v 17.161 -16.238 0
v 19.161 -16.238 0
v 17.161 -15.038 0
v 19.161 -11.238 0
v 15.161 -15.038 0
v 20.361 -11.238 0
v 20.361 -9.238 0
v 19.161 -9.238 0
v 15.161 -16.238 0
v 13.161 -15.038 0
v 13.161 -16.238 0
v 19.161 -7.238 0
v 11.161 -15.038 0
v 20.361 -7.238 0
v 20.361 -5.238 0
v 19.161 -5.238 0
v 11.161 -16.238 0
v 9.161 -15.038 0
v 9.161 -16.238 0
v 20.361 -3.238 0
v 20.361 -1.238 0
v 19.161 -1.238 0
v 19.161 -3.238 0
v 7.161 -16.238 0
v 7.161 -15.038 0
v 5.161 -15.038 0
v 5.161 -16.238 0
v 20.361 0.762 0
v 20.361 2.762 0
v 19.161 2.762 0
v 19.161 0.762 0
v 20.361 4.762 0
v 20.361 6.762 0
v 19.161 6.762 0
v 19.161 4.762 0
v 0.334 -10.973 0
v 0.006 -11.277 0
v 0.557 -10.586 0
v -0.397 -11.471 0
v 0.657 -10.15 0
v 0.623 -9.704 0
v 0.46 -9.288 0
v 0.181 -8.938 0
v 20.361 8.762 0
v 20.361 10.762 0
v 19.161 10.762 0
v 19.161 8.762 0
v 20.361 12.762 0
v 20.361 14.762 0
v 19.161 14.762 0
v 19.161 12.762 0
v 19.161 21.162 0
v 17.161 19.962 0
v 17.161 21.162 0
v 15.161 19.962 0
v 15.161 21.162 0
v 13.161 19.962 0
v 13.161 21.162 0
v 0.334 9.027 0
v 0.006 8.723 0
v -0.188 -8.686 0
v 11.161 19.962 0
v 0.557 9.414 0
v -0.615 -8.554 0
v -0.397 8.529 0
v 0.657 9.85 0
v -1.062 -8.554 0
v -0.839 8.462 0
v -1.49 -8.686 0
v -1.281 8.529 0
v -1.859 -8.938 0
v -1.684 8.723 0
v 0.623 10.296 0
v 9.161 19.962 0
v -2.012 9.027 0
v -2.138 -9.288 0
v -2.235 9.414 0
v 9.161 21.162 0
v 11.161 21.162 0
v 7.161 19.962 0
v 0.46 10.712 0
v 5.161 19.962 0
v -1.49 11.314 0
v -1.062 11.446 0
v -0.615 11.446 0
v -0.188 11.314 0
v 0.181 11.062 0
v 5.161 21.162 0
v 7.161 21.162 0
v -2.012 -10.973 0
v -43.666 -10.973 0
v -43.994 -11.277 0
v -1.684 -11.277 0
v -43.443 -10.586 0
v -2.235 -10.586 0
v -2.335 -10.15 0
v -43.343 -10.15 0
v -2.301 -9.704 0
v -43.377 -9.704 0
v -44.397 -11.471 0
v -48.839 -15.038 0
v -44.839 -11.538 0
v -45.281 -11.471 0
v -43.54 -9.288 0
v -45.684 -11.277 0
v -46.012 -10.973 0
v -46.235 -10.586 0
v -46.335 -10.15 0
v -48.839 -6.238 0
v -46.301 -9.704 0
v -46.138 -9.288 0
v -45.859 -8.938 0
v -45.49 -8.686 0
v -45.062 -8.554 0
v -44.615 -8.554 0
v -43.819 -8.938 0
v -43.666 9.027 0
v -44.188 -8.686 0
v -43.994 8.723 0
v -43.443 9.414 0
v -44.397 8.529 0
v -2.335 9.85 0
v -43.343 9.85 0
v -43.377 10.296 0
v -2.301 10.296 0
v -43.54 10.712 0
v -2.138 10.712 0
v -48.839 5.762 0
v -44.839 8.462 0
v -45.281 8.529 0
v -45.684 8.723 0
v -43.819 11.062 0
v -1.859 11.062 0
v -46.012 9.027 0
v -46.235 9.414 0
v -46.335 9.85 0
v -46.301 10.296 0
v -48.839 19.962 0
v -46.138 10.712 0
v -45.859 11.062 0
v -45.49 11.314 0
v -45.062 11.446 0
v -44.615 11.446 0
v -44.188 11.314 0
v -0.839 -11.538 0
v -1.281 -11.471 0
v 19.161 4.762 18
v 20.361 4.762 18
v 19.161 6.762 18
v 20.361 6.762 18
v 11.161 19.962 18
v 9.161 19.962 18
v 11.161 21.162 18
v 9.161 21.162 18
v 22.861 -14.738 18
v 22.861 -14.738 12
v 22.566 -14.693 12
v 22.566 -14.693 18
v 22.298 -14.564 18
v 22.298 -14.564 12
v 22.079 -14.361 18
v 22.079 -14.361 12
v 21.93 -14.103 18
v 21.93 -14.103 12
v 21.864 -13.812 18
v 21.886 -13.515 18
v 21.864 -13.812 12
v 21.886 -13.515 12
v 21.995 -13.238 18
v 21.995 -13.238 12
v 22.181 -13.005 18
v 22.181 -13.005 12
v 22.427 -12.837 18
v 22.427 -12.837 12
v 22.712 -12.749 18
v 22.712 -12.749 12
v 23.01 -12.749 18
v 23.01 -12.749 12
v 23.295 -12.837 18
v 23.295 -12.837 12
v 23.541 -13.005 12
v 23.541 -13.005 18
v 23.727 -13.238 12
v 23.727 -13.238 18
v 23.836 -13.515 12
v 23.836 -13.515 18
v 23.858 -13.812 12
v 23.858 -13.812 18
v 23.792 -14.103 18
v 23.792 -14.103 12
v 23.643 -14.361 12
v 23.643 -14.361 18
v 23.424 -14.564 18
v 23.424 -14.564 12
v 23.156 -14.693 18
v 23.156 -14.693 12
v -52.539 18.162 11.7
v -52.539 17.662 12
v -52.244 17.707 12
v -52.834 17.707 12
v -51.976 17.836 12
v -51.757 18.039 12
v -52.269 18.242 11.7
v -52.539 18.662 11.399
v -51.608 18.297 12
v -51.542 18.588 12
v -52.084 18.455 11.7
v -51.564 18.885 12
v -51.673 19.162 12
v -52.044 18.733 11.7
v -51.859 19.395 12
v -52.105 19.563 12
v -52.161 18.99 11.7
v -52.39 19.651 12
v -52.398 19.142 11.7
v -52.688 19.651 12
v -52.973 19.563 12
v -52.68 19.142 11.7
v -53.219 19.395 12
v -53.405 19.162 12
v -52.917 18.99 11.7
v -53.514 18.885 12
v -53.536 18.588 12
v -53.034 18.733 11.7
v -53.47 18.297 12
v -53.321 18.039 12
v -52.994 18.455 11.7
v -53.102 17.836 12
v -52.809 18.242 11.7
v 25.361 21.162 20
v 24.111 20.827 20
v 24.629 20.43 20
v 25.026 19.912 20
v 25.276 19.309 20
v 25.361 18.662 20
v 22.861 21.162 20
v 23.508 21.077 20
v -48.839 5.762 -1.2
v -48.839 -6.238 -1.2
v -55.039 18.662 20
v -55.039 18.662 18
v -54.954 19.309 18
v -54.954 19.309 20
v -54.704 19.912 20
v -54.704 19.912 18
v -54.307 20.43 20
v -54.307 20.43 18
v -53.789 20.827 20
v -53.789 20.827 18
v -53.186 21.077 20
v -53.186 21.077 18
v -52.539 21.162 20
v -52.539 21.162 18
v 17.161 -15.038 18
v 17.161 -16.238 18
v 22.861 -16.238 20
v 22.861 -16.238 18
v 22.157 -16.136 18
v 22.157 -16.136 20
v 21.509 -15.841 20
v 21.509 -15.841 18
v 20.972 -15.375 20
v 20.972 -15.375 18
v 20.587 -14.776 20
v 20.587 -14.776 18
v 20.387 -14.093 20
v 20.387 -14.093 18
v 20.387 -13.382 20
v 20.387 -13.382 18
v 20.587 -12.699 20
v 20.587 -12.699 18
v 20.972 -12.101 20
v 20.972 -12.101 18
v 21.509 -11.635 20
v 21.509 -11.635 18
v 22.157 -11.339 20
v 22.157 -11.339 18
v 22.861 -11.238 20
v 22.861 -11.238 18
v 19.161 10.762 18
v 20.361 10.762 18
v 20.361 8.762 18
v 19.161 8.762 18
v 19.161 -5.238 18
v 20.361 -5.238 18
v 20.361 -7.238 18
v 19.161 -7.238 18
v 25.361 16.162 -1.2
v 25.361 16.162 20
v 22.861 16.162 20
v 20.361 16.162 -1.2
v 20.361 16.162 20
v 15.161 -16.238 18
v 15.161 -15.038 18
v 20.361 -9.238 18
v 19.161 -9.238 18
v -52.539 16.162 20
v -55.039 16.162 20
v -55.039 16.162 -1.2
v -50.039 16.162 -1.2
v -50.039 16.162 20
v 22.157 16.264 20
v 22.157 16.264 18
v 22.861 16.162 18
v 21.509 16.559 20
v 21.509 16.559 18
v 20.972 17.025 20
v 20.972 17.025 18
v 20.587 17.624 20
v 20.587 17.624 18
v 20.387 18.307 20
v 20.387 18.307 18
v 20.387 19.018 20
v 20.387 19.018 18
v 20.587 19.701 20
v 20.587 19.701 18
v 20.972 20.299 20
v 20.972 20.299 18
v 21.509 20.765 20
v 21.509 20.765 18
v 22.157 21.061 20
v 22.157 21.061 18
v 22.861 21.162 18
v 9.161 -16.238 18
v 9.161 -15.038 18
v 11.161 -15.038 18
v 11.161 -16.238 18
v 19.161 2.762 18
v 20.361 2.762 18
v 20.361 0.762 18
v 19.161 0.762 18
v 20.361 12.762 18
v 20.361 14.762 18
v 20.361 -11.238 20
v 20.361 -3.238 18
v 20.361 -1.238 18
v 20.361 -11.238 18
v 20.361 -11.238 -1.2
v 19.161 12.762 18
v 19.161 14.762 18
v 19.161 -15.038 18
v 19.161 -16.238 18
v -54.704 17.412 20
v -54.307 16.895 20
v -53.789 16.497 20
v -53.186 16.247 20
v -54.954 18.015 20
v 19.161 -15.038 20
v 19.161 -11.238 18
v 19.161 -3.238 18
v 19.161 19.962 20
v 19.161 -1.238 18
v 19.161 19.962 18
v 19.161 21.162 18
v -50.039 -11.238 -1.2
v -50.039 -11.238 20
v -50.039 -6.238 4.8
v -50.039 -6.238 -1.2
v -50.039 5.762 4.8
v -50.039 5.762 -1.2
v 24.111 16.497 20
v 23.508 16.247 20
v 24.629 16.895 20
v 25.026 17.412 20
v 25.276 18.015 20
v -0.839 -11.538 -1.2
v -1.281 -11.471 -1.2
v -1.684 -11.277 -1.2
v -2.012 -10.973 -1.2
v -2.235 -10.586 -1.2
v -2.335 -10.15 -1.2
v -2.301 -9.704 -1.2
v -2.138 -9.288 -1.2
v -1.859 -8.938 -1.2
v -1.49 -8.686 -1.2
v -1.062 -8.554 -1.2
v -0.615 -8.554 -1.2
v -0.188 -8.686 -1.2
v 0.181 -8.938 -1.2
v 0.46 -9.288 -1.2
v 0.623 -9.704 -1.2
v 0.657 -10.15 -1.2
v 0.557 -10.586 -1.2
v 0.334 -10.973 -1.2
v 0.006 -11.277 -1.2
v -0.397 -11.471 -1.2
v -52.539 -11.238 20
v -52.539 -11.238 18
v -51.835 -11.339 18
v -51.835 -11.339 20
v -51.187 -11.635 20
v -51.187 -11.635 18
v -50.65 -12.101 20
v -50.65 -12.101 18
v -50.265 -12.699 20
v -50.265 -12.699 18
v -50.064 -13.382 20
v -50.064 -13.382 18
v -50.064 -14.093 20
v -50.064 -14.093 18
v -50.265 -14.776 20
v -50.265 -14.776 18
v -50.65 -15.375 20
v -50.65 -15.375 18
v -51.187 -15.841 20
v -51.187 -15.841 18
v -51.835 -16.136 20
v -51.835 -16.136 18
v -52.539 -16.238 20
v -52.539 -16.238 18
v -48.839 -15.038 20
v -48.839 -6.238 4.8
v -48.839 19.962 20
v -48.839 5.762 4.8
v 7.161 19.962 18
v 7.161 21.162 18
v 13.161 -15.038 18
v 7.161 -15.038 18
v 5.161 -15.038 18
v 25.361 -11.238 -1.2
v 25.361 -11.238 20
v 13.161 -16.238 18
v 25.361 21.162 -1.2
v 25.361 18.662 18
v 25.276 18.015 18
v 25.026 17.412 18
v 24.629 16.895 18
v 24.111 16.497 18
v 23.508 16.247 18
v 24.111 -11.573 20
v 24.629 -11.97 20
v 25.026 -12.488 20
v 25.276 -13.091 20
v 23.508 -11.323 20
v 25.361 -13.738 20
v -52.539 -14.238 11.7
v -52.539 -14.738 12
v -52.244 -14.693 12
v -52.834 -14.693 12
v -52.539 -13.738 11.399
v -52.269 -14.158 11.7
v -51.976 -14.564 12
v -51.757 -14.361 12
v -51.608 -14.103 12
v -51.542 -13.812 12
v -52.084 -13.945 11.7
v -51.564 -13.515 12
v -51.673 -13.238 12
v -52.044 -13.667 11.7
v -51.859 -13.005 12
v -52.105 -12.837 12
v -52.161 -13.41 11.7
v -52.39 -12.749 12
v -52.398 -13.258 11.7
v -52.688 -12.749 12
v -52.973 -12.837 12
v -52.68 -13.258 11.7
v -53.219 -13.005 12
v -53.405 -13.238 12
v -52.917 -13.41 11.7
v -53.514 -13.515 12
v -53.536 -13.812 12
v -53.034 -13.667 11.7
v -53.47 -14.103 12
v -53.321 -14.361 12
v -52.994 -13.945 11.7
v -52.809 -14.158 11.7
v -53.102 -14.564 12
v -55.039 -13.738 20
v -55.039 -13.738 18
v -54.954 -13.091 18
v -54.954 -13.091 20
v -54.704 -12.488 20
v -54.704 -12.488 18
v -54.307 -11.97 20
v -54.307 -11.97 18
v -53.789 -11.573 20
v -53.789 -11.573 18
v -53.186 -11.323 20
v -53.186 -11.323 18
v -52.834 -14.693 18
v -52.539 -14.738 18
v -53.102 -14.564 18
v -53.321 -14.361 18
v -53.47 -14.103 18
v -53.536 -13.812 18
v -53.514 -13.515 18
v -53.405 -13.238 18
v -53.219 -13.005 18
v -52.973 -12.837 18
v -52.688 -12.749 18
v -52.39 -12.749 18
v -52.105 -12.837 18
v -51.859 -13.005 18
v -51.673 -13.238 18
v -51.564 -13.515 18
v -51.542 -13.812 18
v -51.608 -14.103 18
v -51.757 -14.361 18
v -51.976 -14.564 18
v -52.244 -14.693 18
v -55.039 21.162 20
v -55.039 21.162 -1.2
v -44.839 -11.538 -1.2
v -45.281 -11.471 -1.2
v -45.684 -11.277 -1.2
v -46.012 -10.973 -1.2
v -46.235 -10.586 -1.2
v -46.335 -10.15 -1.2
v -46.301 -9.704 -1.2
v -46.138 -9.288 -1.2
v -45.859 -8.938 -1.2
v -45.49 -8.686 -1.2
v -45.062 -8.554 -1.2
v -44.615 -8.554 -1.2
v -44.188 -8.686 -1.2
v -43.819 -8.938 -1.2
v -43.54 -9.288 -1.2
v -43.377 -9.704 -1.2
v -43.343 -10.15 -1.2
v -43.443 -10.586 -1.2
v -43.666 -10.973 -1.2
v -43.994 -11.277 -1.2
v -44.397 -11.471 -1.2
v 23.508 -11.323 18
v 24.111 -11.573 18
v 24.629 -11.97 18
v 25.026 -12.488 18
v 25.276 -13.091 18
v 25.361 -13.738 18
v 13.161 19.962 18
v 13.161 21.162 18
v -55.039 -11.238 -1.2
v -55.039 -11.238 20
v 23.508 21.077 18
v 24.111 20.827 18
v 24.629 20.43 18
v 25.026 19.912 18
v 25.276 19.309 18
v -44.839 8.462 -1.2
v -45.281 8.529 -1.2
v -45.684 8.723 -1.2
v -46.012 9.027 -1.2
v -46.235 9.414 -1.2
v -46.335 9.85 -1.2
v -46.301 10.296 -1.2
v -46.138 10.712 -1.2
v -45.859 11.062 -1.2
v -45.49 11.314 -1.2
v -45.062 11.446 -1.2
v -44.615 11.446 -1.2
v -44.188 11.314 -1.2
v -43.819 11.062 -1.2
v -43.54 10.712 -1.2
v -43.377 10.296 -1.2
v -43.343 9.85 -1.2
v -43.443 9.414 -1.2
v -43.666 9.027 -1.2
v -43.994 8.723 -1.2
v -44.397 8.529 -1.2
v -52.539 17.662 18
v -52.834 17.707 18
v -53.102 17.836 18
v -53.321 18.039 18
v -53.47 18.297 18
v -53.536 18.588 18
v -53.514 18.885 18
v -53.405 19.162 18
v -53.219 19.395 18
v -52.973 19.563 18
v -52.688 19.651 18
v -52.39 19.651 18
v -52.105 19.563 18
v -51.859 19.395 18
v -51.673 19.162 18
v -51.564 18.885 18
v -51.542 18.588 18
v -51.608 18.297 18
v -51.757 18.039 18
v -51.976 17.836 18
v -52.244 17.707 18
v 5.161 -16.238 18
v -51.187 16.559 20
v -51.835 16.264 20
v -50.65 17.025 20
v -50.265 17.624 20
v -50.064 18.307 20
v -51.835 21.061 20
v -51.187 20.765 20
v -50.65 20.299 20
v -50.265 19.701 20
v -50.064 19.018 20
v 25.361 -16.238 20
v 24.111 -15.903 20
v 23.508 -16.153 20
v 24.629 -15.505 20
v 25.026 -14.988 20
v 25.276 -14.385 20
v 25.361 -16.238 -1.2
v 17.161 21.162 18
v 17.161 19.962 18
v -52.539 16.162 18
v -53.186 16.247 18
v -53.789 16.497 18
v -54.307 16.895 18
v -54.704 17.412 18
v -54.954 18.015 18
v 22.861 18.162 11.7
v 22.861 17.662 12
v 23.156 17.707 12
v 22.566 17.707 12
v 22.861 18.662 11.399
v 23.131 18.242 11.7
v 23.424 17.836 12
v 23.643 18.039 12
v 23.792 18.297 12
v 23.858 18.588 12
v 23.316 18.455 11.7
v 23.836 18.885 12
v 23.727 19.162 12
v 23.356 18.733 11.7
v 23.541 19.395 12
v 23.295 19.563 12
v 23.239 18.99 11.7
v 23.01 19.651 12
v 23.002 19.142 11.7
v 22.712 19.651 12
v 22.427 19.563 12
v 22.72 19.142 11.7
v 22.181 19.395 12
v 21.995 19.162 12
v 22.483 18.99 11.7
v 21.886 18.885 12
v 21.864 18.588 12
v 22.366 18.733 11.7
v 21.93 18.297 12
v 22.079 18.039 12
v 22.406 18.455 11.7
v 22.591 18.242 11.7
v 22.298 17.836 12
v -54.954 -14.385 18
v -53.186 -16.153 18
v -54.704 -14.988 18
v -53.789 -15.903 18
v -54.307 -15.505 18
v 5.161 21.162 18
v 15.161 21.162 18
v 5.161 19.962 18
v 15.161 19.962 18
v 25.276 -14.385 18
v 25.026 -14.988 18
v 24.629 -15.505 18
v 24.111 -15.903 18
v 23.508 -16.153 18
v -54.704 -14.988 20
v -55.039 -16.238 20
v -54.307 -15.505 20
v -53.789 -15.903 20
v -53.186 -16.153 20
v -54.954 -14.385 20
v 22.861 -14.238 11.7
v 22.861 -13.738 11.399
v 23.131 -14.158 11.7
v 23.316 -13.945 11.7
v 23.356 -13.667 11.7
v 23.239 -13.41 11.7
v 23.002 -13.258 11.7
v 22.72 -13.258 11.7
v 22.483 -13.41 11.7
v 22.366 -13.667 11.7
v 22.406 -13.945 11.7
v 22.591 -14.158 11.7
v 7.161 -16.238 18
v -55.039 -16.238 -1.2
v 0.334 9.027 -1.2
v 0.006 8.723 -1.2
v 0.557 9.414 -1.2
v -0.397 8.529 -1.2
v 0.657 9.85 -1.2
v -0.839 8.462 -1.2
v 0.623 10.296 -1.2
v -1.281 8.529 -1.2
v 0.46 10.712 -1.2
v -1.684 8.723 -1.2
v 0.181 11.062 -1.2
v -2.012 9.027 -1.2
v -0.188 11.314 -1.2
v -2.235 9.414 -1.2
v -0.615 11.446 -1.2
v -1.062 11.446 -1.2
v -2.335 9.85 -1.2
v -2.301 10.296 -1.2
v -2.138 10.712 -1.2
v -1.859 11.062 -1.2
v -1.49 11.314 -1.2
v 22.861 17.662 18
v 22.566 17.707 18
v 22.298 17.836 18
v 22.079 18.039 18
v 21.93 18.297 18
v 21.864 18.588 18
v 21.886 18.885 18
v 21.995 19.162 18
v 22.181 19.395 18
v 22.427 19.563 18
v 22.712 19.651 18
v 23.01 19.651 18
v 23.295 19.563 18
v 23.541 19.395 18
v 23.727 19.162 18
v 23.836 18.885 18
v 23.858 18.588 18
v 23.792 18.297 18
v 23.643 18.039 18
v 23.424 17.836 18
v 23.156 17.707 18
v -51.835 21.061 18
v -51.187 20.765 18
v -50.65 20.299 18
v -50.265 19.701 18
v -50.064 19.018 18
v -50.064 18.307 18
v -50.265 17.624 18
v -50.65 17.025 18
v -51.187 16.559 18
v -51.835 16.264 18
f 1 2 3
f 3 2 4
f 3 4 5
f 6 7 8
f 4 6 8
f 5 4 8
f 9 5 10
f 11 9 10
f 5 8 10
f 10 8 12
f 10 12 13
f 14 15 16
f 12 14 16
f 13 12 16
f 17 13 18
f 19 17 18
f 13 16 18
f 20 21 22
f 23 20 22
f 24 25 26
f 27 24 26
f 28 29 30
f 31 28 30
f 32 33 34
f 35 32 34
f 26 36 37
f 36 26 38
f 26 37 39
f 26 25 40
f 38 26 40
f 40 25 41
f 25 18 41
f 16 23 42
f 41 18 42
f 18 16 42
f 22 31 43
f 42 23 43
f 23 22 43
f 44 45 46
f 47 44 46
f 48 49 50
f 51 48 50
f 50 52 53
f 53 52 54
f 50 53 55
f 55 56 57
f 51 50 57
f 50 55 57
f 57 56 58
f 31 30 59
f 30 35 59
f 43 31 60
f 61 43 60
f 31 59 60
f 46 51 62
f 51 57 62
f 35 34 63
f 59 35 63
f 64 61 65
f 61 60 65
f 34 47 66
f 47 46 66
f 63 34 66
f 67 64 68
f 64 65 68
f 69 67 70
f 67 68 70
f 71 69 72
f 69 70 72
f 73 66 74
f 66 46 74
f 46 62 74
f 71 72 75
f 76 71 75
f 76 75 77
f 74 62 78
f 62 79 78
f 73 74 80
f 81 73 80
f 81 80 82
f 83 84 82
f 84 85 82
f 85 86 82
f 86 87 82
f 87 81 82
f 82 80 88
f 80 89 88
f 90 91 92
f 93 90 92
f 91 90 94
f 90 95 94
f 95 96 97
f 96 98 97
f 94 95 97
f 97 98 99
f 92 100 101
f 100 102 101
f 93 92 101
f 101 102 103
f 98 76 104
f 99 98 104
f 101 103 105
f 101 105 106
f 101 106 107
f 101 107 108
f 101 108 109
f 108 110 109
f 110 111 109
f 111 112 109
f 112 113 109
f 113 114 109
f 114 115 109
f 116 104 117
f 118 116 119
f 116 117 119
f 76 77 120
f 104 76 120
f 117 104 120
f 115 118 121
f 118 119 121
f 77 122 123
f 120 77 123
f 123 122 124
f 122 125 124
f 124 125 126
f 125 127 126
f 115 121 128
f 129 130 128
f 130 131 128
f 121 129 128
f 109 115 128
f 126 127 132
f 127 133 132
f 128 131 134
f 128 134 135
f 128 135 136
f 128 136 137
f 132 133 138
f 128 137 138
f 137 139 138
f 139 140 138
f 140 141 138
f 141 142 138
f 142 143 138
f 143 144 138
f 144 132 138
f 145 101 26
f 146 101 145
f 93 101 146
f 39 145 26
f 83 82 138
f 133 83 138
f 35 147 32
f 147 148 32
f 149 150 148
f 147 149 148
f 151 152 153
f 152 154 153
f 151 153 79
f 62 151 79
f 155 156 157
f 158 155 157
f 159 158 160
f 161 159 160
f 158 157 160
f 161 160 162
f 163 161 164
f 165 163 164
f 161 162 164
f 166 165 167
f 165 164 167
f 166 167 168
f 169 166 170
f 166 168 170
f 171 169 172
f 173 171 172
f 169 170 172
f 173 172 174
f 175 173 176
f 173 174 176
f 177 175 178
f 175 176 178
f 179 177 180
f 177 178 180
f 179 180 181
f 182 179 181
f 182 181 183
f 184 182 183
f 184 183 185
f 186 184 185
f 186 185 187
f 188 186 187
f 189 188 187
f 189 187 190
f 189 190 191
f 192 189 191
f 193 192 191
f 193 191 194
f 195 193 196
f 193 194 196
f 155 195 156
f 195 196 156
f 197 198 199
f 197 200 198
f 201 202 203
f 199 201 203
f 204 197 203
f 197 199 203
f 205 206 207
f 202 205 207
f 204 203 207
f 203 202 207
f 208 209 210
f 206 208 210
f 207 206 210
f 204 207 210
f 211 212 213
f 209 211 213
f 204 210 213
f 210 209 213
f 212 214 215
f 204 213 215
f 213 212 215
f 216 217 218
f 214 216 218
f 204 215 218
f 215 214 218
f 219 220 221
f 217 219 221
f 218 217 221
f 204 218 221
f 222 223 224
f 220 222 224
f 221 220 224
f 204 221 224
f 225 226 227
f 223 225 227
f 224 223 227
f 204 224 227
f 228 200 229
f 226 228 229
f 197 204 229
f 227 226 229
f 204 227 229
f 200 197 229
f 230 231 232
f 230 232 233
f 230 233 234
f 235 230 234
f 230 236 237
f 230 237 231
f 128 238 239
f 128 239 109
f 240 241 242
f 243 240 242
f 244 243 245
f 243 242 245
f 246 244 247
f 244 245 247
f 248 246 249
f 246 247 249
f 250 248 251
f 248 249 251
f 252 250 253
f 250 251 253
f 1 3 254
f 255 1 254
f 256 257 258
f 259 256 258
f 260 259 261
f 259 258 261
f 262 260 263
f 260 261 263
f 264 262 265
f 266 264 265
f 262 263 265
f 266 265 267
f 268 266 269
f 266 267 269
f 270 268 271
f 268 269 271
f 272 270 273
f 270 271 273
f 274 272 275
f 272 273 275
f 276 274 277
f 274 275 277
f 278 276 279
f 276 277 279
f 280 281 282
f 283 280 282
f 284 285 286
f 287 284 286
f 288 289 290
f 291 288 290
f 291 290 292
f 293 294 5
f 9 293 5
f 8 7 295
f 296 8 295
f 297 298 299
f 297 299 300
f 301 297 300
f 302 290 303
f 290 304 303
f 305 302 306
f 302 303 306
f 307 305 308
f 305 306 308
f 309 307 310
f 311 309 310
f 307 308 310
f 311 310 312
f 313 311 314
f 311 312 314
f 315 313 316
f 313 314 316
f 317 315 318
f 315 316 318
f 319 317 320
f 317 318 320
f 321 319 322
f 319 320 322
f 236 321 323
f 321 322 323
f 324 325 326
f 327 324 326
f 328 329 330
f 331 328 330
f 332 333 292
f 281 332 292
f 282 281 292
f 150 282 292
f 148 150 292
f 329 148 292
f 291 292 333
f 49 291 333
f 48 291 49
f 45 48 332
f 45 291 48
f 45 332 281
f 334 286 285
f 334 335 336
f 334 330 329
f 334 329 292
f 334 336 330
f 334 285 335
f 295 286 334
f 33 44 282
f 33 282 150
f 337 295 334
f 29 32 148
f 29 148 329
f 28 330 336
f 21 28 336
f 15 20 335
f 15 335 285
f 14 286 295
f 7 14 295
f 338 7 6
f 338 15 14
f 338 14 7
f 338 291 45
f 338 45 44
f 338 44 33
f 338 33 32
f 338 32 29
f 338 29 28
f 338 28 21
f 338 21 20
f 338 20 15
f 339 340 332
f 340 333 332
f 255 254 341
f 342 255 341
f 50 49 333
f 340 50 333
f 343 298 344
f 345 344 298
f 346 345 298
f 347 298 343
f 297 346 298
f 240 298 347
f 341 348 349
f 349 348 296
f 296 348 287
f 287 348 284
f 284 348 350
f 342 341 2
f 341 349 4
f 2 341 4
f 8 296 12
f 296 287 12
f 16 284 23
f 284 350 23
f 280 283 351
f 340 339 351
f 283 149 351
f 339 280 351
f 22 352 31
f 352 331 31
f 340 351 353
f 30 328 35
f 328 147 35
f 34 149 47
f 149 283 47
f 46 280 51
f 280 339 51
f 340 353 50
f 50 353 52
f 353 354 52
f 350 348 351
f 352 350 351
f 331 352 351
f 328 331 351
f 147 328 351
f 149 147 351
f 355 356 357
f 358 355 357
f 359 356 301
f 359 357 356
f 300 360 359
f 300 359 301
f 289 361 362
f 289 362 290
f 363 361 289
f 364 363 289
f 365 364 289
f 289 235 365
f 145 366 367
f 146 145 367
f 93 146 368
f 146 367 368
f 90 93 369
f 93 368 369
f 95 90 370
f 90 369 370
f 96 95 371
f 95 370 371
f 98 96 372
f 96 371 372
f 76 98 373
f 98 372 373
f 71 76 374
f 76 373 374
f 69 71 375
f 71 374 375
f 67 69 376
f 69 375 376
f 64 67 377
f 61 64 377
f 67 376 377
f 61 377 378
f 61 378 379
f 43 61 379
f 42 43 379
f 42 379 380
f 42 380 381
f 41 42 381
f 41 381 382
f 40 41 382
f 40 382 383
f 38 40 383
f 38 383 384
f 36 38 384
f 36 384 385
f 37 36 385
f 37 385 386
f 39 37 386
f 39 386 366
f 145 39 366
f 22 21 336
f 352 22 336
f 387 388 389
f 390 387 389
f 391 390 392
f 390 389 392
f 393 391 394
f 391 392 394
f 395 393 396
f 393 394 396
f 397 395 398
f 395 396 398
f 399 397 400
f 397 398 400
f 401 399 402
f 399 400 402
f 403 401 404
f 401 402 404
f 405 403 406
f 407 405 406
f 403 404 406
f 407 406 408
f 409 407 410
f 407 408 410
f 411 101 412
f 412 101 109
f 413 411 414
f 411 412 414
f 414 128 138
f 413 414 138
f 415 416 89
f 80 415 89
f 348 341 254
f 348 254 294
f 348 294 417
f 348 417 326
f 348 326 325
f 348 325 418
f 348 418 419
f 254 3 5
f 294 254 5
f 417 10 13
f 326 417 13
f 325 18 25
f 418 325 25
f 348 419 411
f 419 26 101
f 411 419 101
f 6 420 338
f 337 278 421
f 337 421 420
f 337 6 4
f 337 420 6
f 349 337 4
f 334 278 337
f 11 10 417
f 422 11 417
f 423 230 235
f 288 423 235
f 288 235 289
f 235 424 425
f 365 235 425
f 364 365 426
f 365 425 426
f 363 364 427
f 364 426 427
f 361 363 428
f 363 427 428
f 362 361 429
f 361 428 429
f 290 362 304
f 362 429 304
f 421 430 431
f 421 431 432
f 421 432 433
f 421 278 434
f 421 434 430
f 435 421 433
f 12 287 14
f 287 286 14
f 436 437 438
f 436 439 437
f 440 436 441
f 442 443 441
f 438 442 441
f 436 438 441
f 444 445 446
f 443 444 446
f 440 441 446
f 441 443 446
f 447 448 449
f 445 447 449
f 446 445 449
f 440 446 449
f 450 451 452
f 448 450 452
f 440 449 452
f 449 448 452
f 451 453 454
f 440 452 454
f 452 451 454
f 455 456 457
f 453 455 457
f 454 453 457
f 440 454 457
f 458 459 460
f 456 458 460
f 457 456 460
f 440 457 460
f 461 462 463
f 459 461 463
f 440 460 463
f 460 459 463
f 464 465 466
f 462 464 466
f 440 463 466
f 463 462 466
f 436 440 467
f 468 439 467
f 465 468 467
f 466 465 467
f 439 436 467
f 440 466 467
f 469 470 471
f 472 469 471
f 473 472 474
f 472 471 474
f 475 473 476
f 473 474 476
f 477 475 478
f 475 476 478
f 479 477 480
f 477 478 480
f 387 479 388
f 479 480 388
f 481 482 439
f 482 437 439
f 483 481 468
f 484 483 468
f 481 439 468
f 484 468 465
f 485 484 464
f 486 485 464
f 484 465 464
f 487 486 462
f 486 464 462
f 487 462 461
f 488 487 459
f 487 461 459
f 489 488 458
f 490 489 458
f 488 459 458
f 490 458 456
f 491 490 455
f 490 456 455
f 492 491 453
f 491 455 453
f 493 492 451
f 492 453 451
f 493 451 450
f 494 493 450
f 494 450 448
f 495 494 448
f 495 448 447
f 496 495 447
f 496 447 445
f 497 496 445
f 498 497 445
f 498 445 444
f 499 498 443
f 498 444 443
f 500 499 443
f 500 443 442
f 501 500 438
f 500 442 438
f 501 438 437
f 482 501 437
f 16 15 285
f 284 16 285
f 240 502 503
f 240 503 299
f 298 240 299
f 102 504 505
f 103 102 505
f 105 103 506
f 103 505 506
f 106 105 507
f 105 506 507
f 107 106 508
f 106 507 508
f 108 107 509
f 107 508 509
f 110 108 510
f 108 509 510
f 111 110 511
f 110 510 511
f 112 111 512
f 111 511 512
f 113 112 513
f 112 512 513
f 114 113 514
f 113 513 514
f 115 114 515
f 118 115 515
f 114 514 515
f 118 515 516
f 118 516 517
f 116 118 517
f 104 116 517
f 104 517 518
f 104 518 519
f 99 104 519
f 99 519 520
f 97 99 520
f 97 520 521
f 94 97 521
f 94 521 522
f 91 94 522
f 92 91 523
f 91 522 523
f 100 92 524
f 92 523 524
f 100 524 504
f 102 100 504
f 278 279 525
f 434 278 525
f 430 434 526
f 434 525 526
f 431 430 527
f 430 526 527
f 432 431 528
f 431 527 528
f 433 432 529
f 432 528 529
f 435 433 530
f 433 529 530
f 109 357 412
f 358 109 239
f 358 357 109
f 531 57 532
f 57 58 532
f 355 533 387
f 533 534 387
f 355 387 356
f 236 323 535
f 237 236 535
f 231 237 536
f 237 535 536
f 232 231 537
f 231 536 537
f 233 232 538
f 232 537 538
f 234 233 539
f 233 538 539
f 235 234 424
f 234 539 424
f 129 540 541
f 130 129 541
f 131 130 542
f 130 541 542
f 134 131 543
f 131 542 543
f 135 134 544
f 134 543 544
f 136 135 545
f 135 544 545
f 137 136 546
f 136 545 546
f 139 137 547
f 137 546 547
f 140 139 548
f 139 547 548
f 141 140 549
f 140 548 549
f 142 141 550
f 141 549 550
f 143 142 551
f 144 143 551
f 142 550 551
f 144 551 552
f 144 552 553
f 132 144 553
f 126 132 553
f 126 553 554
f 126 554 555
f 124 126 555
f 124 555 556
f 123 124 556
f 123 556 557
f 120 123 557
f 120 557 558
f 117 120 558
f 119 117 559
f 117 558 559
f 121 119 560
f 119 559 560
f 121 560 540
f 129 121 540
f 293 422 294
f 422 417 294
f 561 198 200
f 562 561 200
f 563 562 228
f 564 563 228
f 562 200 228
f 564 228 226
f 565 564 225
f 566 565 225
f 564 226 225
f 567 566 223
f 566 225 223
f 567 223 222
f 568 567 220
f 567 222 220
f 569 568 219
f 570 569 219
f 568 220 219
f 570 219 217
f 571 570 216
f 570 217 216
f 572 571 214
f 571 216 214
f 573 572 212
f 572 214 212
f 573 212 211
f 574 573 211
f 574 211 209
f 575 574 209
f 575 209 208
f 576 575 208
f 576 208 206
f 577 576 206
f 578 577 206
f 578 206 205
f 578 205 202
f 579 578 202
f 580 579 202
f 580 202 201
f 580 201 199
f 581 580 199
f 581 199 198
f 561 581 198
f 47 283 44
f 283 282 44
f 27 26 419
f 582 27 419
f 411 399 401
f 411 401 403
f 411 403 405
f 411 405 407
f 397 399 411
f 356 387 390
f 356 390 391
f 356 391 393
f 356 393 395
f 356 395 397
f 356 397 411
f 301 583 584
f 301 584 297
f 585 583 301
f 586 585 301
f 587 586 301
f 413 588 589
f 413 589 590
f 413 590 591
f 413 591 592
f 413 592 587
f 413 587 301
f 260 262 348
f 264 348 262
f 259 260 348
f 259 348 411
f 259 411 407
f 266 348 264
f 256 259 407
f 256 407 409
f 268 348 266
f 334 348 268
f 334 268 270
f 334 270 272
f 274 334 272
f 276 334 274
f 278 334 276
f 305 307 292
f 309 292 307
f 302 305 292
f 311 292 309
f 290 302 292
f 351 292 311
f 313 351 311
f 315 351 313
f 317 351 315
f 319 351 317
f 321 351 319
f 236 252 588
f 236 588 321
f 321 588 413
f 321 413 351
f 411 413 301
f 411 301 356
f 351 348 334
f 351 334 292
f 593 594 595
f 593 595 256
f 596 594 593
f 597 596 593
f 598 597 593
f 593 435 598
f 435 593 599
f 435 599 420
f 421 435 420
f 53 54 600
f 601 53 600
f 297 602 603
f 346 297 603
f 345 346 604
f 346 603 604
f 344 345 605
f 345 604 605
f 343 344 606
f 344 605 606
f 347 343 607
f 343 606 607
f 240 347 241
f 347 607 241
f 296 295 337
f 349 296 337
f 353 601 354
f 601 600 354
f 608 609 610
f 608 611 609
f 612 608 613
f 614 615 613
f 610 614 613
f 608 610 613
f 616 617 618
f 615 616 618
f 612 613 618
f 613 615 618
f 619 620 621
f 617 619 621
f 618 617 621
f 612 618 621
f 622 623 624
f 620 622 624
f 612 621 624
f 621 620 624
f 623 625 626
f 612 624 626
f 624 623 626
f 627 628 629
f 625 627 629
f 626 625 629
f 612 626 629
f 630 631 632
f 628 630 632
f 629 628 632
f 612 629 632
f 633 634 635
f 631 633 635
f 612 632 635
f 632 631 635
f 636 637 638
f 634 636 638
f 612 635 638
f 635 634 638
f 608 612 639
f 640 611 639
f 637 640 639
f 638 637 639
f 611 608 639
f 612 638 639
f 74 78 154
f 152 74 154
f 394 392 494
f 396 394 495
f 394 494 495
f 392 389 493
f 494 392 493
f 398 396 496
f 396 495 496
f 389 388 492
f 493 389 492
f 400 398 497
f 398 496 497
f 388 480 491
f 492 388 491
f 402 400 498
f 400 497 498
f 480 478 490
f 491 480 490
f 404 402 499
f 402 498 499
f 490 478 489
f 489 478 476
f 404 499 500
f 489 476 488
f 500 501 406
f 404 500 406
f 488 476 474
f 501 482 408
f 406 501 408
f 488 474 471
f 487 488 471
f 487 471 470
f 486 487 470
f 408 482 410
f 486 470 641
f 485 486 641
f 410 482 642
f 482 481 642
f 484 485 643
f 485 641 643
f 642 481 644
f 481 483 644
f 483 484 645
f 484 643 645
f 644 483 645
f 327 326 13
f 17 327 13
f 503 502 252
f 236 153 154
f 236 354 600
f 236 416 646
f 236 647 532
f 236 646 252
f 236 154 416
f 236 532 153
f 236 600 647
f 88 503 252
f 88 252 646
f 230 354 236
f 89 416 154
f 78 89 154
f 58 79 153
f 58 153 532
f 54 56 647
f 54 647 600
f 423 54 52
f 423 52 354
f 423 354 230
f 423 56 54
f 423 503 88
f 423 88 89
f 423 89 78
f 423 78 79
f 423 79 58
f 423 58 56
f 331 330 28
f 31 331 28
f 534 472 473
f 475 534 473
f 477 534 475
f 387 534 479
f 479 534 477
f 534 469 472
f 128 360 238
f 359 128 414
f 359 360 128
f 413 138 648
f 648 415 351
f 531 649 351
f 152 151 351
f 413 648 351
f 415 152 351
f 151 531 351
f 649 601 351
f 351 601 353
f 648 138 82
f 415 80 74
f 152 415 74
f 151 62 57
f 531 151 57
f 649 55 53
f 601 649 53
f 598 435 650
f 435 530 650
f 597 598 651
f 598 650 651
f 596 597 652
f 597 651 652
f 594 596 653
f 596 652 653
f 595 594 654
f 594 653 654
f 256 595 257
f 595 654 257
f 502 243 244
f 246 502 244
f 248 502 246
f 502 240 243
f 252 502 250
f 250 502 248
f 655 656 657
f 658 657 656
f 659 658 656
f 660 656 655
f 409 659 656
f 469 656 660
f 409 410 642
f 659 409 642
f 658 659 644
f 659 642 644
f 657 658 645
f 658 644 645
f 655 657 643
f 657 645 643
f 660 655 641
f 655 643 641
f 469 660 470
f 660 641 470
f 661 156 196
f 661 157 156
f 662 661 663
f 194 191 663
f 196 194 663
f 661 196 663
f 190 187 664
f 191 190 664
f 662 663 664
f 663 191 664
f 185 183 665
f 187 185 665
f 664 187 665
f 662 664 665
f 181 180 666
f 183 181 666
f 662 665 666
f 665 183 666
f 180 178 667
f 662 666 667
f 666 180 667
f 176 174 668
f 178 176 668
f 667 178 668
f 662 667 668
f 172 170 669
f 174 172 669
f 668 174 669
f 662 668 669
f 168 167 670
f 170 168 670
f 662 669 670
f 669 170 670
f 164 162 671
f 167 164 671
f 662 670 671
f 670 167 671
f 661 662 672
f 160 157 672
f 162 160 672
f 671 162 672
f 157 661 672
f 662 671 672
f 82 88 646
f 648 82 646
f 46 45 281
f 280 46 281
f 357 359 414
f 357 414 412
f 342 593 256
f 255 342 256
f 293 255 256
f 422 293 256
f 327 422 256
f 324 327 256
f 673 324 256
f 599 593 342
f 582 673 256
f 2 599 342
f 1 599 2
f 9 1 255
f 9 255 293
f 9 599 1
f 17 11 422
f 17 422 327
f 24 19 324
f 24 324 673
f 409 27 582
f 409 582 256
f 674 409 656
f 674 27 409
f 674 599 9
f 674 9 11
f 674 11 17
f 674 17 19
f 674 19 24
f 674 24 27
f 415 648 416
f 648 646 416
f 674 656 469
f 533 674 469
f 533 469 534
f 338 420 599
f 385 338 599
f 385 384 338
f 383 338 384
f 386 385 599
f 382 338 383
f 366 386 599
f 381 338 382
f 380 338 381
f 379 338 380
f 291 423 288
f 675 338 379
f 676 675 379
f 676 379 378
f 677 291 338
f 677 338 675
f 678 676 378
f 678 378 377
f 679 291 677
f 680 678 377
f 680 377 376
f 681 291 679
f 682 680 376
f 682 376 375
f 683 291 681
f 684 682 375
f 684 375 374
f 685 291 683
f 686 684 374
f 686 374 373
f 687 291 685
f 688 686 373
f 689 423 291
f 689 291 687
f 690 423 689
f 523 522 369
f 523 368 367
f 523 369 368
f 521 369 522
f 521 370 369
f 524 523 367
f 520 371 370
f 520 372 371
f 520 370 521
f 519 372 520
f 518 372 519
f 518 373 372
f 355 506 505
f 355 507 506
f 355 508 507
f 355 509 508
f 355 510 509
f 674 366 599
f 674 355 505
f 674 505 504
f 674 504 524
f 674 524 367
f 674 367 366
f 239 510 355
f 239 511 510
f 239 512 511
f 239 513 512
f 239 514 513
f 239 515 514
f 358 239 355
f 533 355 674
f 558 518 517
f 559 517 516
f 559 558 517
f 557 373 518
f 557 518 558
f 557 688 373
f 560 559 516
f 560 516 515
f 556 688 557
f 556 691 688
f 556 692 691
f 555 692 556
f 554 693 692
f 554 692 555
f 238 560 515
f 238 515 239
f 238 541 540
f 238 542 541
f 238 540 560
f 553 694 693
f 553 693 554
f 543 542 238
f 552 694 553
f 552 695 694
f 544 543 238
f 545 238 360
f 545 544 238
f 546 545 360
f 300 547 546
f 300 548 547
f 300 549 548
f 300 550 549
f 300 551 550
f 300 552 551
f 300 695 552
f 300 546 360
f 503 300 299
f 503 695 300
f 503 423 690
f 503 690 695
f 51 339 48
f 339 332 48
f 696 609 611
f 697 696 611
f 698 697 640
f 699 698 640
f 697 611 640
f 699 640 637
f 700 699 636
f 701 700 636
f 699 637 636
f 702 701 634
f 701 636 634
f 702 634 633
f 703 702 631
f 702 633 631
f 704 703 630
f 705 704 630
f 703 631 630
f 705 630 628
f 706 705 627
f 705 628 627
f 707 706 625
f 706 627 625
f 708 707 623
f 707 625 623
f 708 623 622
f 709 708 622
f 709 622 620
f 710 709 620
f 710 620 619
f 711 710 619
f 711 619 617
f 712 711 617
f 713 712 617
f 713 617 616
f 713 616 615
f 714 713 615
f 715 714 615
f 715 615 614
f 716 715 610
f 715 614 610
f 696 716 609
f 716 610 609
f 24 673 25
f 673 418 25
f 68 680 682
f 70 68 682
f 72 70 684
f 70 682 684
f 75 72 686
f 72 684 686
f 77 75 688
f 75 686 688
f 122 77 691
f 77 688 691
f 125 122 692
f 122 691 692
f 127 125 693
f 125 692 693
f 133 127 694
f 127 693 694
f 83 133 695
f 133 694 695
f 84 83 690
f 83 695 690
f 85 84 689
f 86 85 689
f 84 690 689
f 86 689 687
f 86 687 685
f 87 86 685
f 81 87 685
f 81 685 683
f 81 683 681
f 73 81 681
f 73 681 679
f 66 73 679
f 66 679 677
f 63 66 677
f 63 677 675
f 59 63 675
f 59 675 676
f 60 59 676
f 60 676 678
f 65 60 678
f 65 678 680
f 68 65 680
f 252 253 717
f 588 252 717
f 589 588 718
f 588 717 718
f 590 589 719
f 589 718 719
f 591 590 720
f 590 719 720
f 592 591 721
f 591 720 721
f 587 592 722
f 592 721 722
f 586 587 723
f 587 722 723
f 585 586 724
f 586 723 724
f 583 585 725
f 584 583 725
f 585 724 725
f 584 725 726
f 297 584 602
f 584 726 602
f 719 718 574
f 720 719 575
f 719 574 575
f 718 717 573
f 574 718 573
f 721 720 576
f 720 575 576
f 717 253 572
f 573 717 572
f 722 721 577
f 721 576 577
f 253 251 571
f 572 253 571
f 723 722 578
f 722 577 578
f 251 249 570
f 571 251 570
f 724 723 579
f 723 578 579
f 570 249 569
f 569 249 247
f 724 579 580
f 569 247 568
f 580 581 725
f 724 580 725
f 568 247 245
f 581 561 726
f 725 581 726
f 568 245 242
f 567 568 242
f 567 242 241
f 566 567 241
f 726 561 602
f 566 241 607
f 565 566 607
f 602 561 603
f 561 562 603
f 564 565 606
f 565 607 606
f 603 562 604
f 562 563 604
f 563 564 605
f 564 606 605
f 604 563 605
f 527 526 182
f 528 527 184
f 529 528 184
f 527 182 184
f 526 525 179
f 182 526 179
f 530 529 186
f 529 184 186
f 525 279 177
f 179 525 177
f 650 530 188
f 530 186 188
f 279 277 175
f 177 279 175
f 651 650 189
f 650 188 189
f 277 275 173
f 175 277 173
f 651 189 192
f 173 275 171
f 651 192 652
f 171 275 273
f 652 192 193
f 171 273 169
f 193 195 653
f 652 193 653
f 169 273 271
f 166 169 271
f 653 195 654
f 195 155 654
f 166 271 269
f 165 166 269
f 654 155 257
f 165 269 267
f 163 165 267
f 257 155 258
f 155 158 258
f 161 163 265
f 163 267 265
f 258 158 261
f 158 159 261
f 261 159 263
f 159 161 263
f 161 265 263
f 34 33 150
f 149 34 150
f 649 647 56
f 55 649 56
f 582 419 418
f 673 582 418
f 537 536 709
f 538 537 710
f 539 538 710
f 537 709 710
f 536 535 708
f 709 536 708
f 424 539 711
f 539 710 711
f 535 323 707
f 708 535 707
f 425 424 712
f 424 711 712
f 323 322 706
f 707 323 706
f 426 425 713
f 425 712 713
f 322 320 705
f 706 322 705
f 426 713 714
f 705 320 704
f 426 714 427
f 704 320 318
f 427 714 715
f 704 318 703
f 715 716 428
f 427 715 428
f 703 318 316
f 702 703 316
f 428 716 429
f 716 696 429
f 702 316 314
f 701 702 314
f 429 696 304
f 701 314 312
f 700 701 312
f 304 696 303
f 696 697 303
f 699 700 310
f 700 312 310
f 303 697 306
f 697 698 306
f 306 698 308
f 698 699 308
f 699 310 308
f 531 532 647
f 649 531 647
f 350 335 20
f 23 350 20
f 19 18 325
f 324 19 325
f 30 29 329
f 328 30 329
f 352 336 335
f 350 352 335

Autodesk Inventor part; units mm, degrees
ref_plane "YZ Plane" through (0, 0, 0) normal (1, 0, 0) x (0, 1, 0)
ref_plane "XZ Plane" through (0, 0, 0) normal (0, 1, 0) x (-1, 0, 0)
ref_plane "XY Plane" through (0, 0, 0) normal (0, 0, 1) x (1, 0, 0)
sketch "Sketch1" plane through (0, 0, 0) normal (0, 0, 1) x (1, 0, 0)
  line L0 (-48.8389, 19.9623) -> (19.1611, 19.9623)
  line L1 (19.1611, 19.9623) -> (19.1611, -15.0377)
  line L2 (19.1611, -15.0377) -> (-48.8389, -15.0377)
  line L3 (-48.8389, -15.0377) -> (-48.8389, 19.9623)
  line L4 (-50.0389, 21.1623) -> (20.3611, 21.1623)
  line L5 (20.3611, 21.1623) -> (20.3611, -16.2377)
  line L6 (20.3611, -16.2377) -> (-50.0389, -16.2377)
  line L7 (-50.0389, -16.2377) -> (-50.0389, 21.1623)
  point P0 (0, 0)
  dimension "d0" = 35
  dimension "d1" = 68
  dimension "d2" = 1.2
  dimension "d3" = 1.2
  dimension "d4" = 1.2
  dimension "d5" = 1.2
extrude "Extrusion1" add sketch "Sketch1" along normal blind 20
sketch "Sketch2" plane through (0, 0, 0) normal (0, 0, -1) x (-1, 0, 0)
  line L0 (-20.3611, 21.1623) -> (50.0389, 21.1623)
  line L1 (50.0389, 21.1623) -> (50.0389, -16.2377)
  line L2 (50.0389, -16.2377) -> (-20.3611, -16.2377)
  line L3 (-20.3611, -16.2377) -> (-20.3611, 21.1623)
  point P0 (0, 0)
extrude "Extrusion2" add sketch "Sketch2" along normal blind 1.2
sketch "Sketch3" plane through (-50.0389, -16.2377, 20) normal (-1, 0, 0) x (0, 0, 1)
  line L0 (-21.2, 0) -> (-21.2, 37.4) projected
  line L1 (-21.2, 22) -> (-15.2, 22)
  line L2 (-15.2, 22) -> (-15.2, 10)
  line L3 (-15.2, 10) -> (-21.2, 10)
  line L4 (-21.2, 10) -> (-21.2, 22)
  line L5 (0, 0) -> (-21.2, 0) projected
  point P0 (-20, 16.2377)
  dimension "d10" = 10
  dimension "d11" = 22
  dimension "d12" = 6
extrude "Extrusion3" cut sketch "Sketch3" against normal blind 1.2
sketch "Sketch4" plane through (0, 0, 0) normal (0, 0, 1) x (1, 0, 0)
  line L0 (19.1611, -15.0377) -> (-48.8389, -15.0377) projected
  line L1 (-48.8389, -15.0377) -> (-48.8389, 19.9623) projected
  circle A0 centre (-44.8389, 9.9623) radius 2.5
  circle A1 centre (-44.8389, -10.0377) radius 2.5
  circle A2 centre (-0.8389, 9.9623) radius 2.5
  circle A3 centre (-0.8389, -10.0377) radius 2.5
  point P0 (0, 0)
  dimension "d15" = 5
  dimension "d16" = 25
  dimension "d17" = 4
  dimension "d18" = 4
  dimension "d19" = 44
  dimension "d20" = 44
  dimension "d21" = 5
  dimension "d22" = 25
  dimension "d23" = 5
  dimension "d24" = 5
  dimension "d25" = 5
  dimension "d26" = 5
hole "Hole1" at (-44.8389, -10.0377, 0) at (-44.8389, 9.9623, 0) at (-0.8389, 9.9623, 0) at (-0.8389, -10.0377, 0) direction (0, 0, -1) diameter 3 depth 8 tip angle 118
sketch "Sketch5" plane through (0, 0, 20) normal (0, 0, 1) x (1, 0, 0)
  line L0 (-50.0389, 21.1623) -> (-55.0389, 21.1623)
  line L1 (-55.0389, 21.1623) -> (-55.0389, 16.1623)
  line L2 (-55.0389, 16.1623) -> (-50.0389, 16.1623)
  line L3 (-50.0389, 16.1623) -> (-50.0389, 21.1623)
  line L4 (-50.0389, -16.2377) -> (-55.0389, -16.2377)
  line L5 (-55.0389, -16.2377) -> (-55.0389, -11.2377)
  line L6 (-55.0389, -11.2377) -> (-50.0389, -11.2377)
  line L7 (-50.0389, -11.2377) -> (-50.0389, -16.2377)
  line L8 (20.3611, -16.2377) -> (25.3611, -16.2377)
  line L9 (25.3611, -16.2377) -> (25.3611, -11.2377)
  line L10 (25.3611, -11.2377) -> (20.3611, -11.2377)
  line L11 (20.3611, -11.2377) -> (20.3611, -16.2377)
  line L12 (20.3611, 21.1623) -> (25.3611, 21.1623)
  line L13 (25.3611, 21.1623) -> (25.3611, 16.1623)
  line L14 (25.3611, 16.1623) -> (20.3611, 16.1623)
  line L15 (20.3611, 16.1623) -> (20.3611, 21.1623)
  line L16 (20.3611, -16.2377) -> (20.3611, 21.1623) projected
  point P0 (0, 0)
  dimension "d34" = 5
  dimension "d35" = 5
  dimension "d36" = 5
  dimension "d37" = 5
  dimension "d38" = 5
  dimension "d39" = 5
  dimension "d40" = 5
  dimension "d41" = 5
extrude "Extrusion4" add sketch "Sketch5" against normal blind 21.2
sketch "Sketch6" plane through (20.3611, -11.2377, -1.2) normal (1, 0, 0) x (0, 0, -1)
  line L0 (-21.2, 0) -> (0, 0) projected
  line L1 (-19.2, 0) -> (-1.2, 0)
  line L2 (-1.2, 0) -> (-1.2, 2)
  line L3 (-1.2, 2) -> (-19.2, 2)
  line L4 (-19.2, 2) -> (-19.2, 0)
  line L5 (-1.2, -3.8) -> (-1.2, 31.2) projected
  line L6 (-19.2, 4) -> (-1.2, 4)
  line L7 (-1.2, 4) -> (-1.2, 6)
  line L8 (-1.2, 6) -> (-19.2, 6)
  line L9 (-19.2, 6) -> (-19.2, 4)
  line L10 (-19.2, 8) -> (-1.2, 8)
  line L11 (-1.2, 8) -> (-1.2, 10)
  line L12 (-1.2, 10) -> (-19.2, 10)
  line L13 (-19.2, 10) -> (-19.2, 8)
  line L14 (-19.2, 12) -> (-1.2, 12)
  line L15 (-1.2, 12) -> (-1.2, 14)
  line L16 (-1.2, 14) -> (-19.2, 14)
  line L17 (-19.2, 14) -> (-19.2, 12)
  line L18 (-19.2, 16) -> (-1.2, 16)
  line L19 (-1.2, 16) -> (-1.2, 18)
  line L20 (-1.2, 18) -> (-19.2, 18)
  line L21 (-19.2, 18) -> (-19.2, 16)
  line L22 (-19.2, 20) -> (-1.2, 20)
  line L23 (-1.2, 20) -> (-1.2, 22)
  line L24 (-1.2, 22) -> (-19.2, 22)
  line L25 (-19.2, 22) -> (-19.2, 20)
  line L26 (-19.2, 24) -> (-1.2, 24)
  line L27 (-1.2, 24) -> (-1.2, 26)
  line L28 (-1.2, 26) -> (-19.2, 26)
  line L29 (-19.2, 26) -> (-19.2, 24)
  point P0 (-1.2, 11.2377)
  point P1 (-19.2, -2)
  dimension "d44" = 18
  dimension "d45" = 2
  dimension "d46" = 2
  dimension "d47" = 18
  dimension "d48" = 2
  dimension "d49" = 18
  dimension "d50" = 2
  dimension "d51" = 18
  dimension "d52" = 2
  dimension "d53" = 18
  dimension "d54" = 2
  dimension "d55" = 18
  dimension "d56" = 2
  dimension "d57" = 18
  dimension "d58" = 2
extrude "Extrusion5" cut sketch "Sketch6" against normal blind 1.2
sketch "Sketch7" plane through (-55.0389, 21.1623, 20) normal (0, 1, 0) x (1, 0, 0)
  line L0 (74.2, 20) -> (72.2, 20)
  line L1 (72.2, 20) -> (72.2, 2)
  line L2 (72.2, 2) -> (74.2, 2)
  line L3 (74.2, 2) -> (74.2, 20)
  line L4 (70.2, 20) -> (68.2, 20)
  line L5 (68.2, 20) -> (68.2, 2)
  line L6 (68.2, 2) -> (70.2, 2)
  line L7 (70.2, 2) -> (70.2, 20)
  line L8 (66.2, 20) -> (64.2, 20)
  line L9 (64.2, 20) -> (64.2, 2)
  line L10 (64.2, 2) -> (66.2, 2)
  line L11 (66.2, 2) -> (66.2, 20)
  line L12 (62.2, 20) -> (60.2, 20)
  line L13 (60.2, 20) -> (60.2, 2)
  line L14 (60.2, 2) -> (62.2, 2)
  line L15 (62.2, 2) -> (62.2, 20)
  point P0 (55.0389, 20)
  point P1 (76.2, 2)
  dimension "d61" = 2
  dimension "d62" = 18
  dimension "d63" = 2
  dimension "d64" = 2
  dimension "d65" = 18
  dimension "d66" = 2
  dimension "d67" = 18
  dimension "d68" = 2
  dimension "d69" = 18
extrude "Extrusion6" cut sketch "Sketch7" against normal blind 100
sketch "Sketch8" plane through (0, 0, 20) normal (0, 0, 1) x (1, 0, 0)
  line L0 (25.3611, -16.2377) -> (-55.0389, -16.2377) projected
  line L1 (25.3611, -11.2377) -> (25.3611, -16.2377) projected
  line L2 (25.3611, 21.1623) -> (25.3611, 16.1623) projected
  line L3 (25.3611, 16.1623) -> (20.3611, 16.1623) projected
  line L4 (-55.0389, 21.1623) -> (25.3611, 21.1623) projected
  line L5 (-55.0389, 21.1623) -> (-55.0389, 16.1623) projected
  line L6 (-55.0389, -16.2377) -> (-55.0389, -11.2377) projected
  point P0 (0, 0)
  point P1 (22.8611, -13.7377)
  point P2 (22.8611, 18.6623)
  point P3 (-52.5389, 18.6623)
  point P4 (-52.5389, -13.7377)
  dimension "d72" = 2.5
  dimension "d73" = 2.5
  dimension "d74" = 2.5
  dimension "d75" = 2.5
  dimension "d76" = 2.5
  dimension "d77" = 2.5
  dimension "d78" = 2.5
  dimension "d79" = 2.5
hole "Hole2" at (22.8611, -13.7377, 20) at (22.8611, 18.6623, 20) at (-52.5389, 18.6623, 20) at (-52.5389, -13.7377, 20) direction (0, 0, -1) diameter 2 depth 8 tip angle 118 counterbore diameter 5 counterbore depth 2
properties part number "case body"
